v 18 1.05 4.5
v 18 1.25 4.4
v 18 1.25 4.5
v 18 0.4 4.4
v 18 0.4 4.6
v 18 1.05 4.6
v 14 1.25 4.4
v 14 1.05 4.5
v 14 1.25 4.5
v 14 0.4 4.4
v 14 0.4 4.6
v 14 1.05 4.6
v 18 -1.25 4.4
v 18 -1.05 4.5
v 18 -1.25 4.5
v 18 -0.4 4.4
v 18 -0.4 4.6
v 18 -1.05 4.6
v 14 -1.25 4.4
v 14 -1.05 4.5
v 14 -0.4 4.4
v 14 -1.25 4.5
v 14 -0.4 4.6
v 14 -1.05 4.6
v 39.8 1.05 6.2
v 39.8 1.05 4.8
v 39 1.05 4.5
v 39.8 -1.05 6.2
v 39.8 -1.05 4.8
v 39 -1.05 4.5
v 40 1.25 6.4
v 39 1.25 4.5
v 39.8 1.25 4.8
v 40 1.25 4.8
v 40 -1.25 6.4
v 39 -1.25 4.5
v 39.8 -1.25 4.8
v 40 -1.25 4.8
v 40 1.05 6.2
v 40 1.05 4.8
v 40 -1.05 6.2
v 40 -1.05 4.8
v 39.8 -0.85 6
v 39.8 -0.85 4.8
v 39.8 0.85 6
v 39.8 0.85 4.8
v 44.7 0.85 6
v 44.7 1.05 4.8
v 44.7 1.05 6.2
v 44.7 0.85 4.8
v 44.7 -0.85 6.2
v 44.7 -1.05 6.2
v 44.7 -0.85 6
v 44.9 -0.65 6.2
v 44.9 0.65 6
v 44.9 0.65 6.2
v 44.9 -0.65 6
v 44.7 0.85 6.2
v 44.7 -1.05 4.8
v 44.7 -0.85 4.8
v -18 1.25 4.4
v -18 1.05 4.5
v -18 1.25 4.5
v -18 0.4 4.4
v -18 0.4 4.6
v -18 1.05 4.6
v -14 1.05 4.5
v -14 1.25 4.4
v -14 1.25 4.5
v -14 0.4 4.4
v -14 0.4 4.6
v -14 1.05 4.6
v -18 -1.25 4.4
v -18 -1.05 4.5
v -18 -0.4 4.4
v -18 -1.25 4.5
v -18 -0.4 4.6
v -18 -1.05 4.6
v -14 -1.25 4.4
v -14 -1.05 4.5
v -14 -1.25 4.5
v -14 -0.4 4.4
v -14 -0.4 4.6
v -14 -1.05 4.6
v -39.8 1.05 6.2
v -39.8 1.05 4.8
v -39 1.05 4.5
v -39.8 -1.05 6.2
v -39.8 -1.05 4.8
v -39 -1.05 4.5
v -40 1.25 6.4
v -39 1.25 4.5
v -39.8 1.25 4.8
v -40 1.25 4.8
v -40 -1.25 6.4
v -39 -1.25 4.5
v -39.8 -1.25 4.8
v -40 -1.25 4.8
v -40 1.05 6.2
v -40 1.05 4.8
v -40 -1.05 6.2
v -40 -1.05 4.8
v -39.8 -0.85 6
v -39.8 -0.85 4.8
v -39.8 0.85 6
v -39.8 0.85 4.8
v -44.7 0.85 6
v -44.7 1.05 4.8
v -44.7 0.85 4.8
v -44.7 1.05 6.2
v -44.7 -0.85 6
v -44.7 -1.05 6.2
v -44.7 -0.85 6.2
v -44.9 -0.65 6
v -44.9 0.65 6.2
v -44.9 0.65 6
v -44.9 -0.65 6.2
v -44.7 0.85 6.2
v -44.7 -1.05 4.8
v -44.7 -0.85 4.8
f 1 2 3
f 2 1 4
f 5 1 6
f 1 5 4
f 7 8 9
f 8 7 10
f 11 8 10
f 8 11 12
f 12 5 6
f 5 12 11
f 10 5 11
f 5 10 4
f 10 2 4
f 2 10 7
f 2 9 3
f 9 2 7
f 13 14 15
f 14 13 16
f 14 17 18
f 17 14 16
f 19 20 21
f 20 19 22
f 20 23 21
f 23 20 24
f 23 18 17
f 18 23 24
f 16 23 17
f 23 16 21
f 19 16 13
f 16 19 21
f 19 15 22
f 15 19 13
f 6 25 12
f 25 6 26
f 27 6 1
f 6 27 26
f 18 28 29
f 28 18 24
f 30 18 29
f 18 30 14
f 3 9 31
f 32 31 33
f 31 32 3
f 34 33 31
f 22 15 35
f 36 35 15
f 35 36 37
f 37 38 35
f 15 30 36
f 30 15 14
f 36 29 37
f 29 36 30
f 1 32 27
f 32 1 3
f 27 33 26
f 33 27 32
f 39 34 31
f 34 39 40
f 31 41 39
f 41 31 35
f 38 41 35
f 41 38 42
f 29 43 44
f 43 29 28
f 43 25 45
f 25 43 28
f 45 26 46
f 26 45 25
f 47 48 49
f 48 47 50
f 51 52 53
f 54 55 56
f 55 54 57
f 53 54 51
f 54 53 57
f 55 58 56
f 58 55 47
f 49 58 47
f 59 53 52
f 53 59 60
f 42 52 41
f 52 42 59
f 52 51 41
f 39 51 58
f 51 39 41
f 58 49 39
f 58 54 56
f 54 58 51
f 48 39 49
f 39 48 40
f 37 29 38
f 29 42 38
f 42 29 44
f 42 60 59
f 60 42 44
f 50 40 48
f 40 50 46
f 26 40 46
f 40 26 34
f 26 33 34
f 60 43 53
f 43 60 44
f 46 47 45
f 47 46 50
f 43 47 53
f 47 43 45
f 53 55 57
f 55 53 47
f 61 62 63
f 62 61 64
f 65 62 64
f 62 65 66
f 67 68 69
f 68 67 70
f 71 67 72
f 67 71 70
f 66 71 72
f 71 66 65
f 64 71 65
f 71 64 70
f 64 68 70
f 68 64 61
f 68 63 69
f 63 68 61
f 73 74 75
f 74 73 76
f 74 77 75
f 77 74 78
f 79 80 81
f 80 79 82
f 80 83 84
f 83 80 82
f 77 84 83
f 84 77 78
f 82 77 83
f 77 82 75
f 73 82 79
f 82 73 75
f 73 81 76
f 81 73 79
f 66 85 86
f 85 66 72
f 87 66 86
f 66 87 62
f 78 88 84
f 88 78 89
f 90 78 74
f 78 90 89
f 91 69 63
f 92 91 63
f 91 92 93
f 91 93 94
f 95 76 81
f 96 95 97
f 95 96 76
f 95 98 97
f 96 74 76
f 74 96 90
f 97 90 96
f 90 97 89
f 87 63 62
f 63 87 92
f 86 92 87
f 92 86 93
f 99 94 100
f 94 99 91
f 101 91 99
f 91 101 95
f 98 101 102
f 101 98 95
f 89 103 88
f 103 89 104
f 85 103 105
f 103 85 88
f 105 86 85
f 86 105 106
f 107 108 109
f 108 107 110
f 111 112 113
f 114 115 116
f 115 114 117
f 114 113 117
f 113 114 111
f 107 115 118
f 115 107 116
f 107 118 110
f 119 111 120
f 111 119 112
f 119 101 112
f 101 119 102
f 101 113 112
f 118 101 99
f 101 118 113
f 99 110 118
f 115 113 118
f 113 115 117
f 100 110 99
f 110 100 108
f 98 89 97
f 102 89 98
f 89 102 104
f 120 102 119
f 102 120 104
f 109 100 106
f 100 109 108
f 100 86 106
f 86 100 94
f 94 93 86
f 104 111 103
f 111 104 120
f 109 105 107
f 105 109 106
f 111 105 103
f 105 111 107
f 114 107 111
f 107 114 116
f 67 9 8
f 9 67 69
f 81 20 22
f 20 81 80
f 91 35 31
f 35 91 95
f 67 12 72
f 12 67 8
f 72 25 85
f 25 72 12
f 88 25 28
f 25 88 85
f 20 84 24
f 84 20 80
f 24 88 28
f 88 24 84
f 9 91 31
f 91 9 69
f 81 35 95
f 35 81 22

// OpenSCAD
// file: ../p/box2-7.scad
use <../lib.scad>
function ldraw_lib__box2_7() = [
// 0 Box with  2 Faces without  7 Edges
// 0 Name: box2-7.dat
// 0 Author: Willy Tschager [Holly-Wood]
// 0 !LDRAW_ORG Primitive UPDATE 2024-01
// 0 !LICENSE Licensed under CC BY 4.0 : see CAreadme.txt
// 
// 0 BFC CERTIFY CCW
  [0,"BFC","CERTIFY"],
  [0,"BFC","CCW"],
// 
// 0 !HISTORY 2009-05-02 [PTadmin] Official Update 2009-01
// 0 !HISTORY 2024-01-02 [Holly-Wood] Complete re-write, original by guyvivan
// 0 !HISTORY 2024-01-29 [OrionP] Official Update 2024-01
// 
// 2 24 -1 1 -1 -1 1 1
  [2,24,-1,1,-1,-1,1,1],
// 2 24 1 1 1 1 1 -1
  [2,24,1,1,1,1,1,-1],
// 4 16 -1 1 1 1 1 1 1 1 -1 -1 1 -1
  [4,16,-1,1,1,1,1,1,1,1,-1,-1,1,-1],
// 
// 2 24 -1 1 1 -1 -1 1
  [2,24,-1,1,1,-1,-1,1],
// 2 24 1 1 1 1 -1 1
  [2,24,1,1,1,1,-1,1],
// 4 16 1 -1 1 1 1 1 -1 1 1 -1 -1 1
  [4,16,1,-1,1,1,1,1,-1,1,1,-1,-1,1],
// 
// 2 24 -1 1 1 1 1 1
  [2,24,-1,1,1,1,1,1],
];
module ldraw_lib__box2_7(step=0, col=false, unit=2/5, alt=false, line=0.2, solid=!$preview)
    makepoly(ldraw_lib__box2_7(), step=step, col=col, unit=unit, alt=alt, line=line, solid=solid);
ldraw_lib__box2_7(line=0.2);
// file: s/u9611s02.scad
use <../../lib.scad>
use <../../p/box2-5.scad>
use <../../p/box2-7.scad>
function ldraw_lib__s__u9611s02() = [
// 0 ~Train Track  9V Straight - Metal Rail, Clamp
// 0 Name: s\u9611s02.dat
// 0 Author: Max Martin Richter [MMR1988]
// 0 !LDRAW_ORG Subpart UPDATE 2025-02
// 0 !LICENSE Licensed under CC BY 4.0 : see CAreadme.txt
// 
// 0 BFC CERTIFY CCW
  [0,"BFC","CERTIFY"],
  [0,"BFC","CCW"],
// 
// 0 !HISTORY 2025-02-27 [OrionP] Official Update 2025-02
// 
// 4 16 5 -11 3.125 5 -11.25 3.125 5 -11.25 2.625 5 -11 1
  [4,16,5,-11,3.125,5,-11.25,3.125,5,-11.25,2.625,5,-11,1],
// 4 16 5 -11.25 2.625 5 -11.5 2.625 5 -11.5 1 5 -11 1
  [4,16,5,-11.25,2.625,5,-11.5,2.625,5,-11.5,1,5,-11,1],
// 4 16 -5 -11.25 2.625 -5 -11.25 3.125 -5 -11 3.125 -5 -11 1
  [4,16,-5,-11.25,2.625,-5,-11.25,3.125,-5,-11,3.125,-5,-11,1],
// 4 16 -5 -11.25 2.625 -5 -11 1 -5 -11.5 1 -5 -11.5 2.625
  [4,16,-5,-11.25,2.625,-5,-11,1,-5,-11.5,1,-5,-11.5,2.625],
// 1 16 0 -11.25 1.8125 5 0 0 0 -.25 0 0 0 -.8125 box2-5.dat
  [1,16,0,-11.25,1.8125,5,0,0,0,-.25,0,0,0,-.8125, ldraw_lib__box2_5()],
// 1 16 0 -11.125 2.0625 5 0 0 0 .125 0 0 0 1.0625 box2-7.dat
  [1,16,0,-11.125,2.0625,5,0,0,0,.125,0,0,0,1.0625, ldraw_lib__box2_7()],
// 2 24 5 -11.5 2.625 5 -11.25 2.625
  [2,24,5,-11.5,2.625,5,-11.25,2.625],
// 2 24 -5 -11.5 2.625 -5 -11.25 2.625
  [2,24,-5,-11.5,2.625,-5,-11.25,2.625],
// 
// 4 16 5 -11.25 -2.625 5 -11.25 -3.125 5 -11 -3.125 5 -11 -1
  [4,16,5,-11.25,-2.625,5,-11.25,-3.125,5,-11,-3.125,5,-11,-1],
// 4 16 5 -11.5 -1 5 -11.5 -2.625 5 -11.25 -2.625 5 -11 -1
  [4,16,5,-11.5,-1,5,-11.5,-2.625,5,-11.25,-2.625,5,-11,-1],
// 4 16 -5 -11 -3.125 -5 -11.25 -3.125 -5 -11.25 -2.625 -5 -11 -1
  [4,16,-5,-11,-3.125,-5,-11.25,-3.125,-5,-11.25,-2.625,-5,-11,-1],
// 4 16 -5 -11.5 -1 -5 -11 -1 -5 -11.25 -2.625 -5 -11.5 -2.625
  [4,16,-5,-11.5,-1,-5,-11,-1,-5,-11.25,-2.625,-5,-11.5,-2.625],
// 1 16 0 -11.25 -1.8125 5 0 0 0 -.25 0 0 0 .8125 box2-5.dat
  [1,16,0,-11.25,-1.8125,5,0,0,0,-.25,0,0,0,.8125, ldraw_lib__box2_5()],
// 1 16 0 -11.125 -2.0625 5 0 0 0 .125 0 0 0 -1.0625 box2-7.dat
  [1,16,0,-11.125,-2.0625,5,0,0,0,.125,0,0,0,-1.0625, ldraw_lib__box2_7()],
// 2 24 5 -11.5 -2.625 5 -11.25 -2.625
  [2,24,5,-11.5,-2.625,5,-11.25,-2.625],
// 2 24 -5 -11.5 -2.625 -5 -11.25 -2.625
  [2,24,-5,-11.5,-2.625,-5,-11.25,-2.625],
];
module ldraw_lib__s__u9611s02(step=0, col=false, unit=2/5, alt=false, line=0.2, solid=!$preview)
    makepoly(ldraw_lib__s__u9611s02(), step=step, col=col, unit=unit, alt=alt, line=line, solid=solid);
ldraw_lib__s__u9611s02(line=0.2);
// file: ../p/recte3.scad
use <../lib.scad>
function ldraw_lib__recte3() = [
// 0 Rectangle Empty with 3 Edges
// 0 Name: recte3.dat
// 0 Author: Steffen [Steffen]
// 0 !LDRAW_ORG Primitive UPDATE 2011-01
// 0 !LICENSE Licensed under CC BY 4.0 : see CAreadme.txt
// 
// 0 BFC CERTIFY CCW
  [0,"BFC","CERTIFY"],
  [0,"BFC","CCW"],
// 
// 0 !HISTORY 2011-07-25 [PTadmin] Official Update 2011-01
// 
// 
// 2 24 1 0 1 -1 0 1
  [2,24,1,0,1,-1,0,1],
// 2 24 -1 0 1 -1 0 -1
  [2,24,-1,0,1,-1,0,-1],
// 2 24 1 0 -1 1 0 1
  [2,24,1,0,-1,1,0,1],
];
module ldraw_lib__recte3(step=0, col=false, unit=2/5, alt=false, line=0.2, solid=!$preview)
    makepoly(ldraw_lib__recte3(), step=step, col=col, unit=unit, alt=alt, line=line, solid=solid);
ldraw_lib__recte3(line=0.2);
// file: ../p/rect3.scad
use <../lib.scad>
function ldraw_lib__rect3() = [
// 0 Rectangle with 3 Edges
// 0 Name: rect3.dat
// 0 Author: Mark Kennedy [mkennedy]
// 0 !LDRAW_ORG Primitive UPDATE 2010-01
// 0 !LICENSE Licensed under CC BY 4.0 : see CAreadme.txt
// 
// 0 BFC CERTIFY CCW
  [0,"BFC","CERTIFY"],
  [0,"BFC","CCW"],
// 
// 0 !HISTORY 2003-08-01 [PTadmin] Official Update 2003-02
// 0 !HISTORY 2007-06-24 [PTadmin] Header formatted for Contributor Agreement
// 0 !HISTORY 2008-07-01 [PTadmin] Official Update 2008-01
// 0 !HISTORY 2010-01-17 [mikeheide] Change winding to CCW
// 0 !HISTORY 2010-04-05 [PTadmin] Official Update 2010-01
// 
// 
// 2 24 1 0 1 -1 0 1
  [2,24,1,0,1,-1,0,1],
// 2 24 1 0 1 1 0 -1
  [2,24,1,0,1,1,0,-1],
// 2 24 -1 0 1 -1 0 -1
  [2,24,-1,0,1,-1,0,-1],
// 4 16 -1 0 1 -1 0 -1 1 0 -1 1 0 1
  [4,16,-1,0,1,-1,0,-1,1,0,-1,1,0,1],
// 0 //
];
module ldraw_lib__rect3(step=0, col=false, unit=2/5, alt=false, line=0.2, solid=!$preview)
    makepoly(ldraw_lib__rect3(), step=step, col=col, unit=unit, alt=alt, line=line, solid=solid);
ldraw_lib__rect3(line=0.2);
// file: ../p/box2-5.scad
use <../lib.scad>
function ldraw_lib__box2_5() = [
// 0 Box with 2 Faces without 5 Edges
// 0 Name: box2-5.dat
// 0 Author: Steffen [Steffen]
// 0 !LDRAW_ORG Primitive UPDATE 2003-03
// 0 !LICENSE Licensed under CC BY 4.0 : see CAreadme.txt
// 
// 0 BFC CERTIFY CCW
  [0,"BFC","CERTIFY"],
  [0,"BFC","CCW"],
// 
// 0 !HISTORY 2003-12-19 [PTadmin] Official Update 2003-03
// 0 !HISTORY 2007-06-24 [PTadmin] Header formatted for Contributor Agreement
// 0 !HISTORY 2008-07-01 [PTadmin] Official Update 2008-01
// 
// 
// 2 24 1 1 1 -1 1 1
  [2,24,1,1,1,-1,1,1],
// 2 24 1 1 -1 -1 1 -1
  [2,24,1,1,-1,-1,1,-1],
// 2 24 1 -1 1 -1 -1 1
  [2,24,1,-1,1,-1,-1,1],
// 2 24 -1 -1 1 -1 1 1
  [2,24,-1,-1,1,-1,1,1],
// 2 24 1 -1 1 1 1 1
  [2,24,1,-1,1,1,1,1],
// 2 24 -1 1 -1 -1 1 1
  [2,24,-1,1,-1,-1,1,1],
// 2 24 1 1 -1 1 1 1
  [2,24,1,1,-1,1,1,1],
// 4 16 1 1 1 1 1 -1 -1 1 -1 -1 1 1
  [4,16,1,1,1,1,1,-1,-1,1,-1,-1,1,1],
// 4 16 1 1 1 -1 1 1 -1 -1 1 1 -1 1
  [4,16,1,1,1,-1,1,1,-1,-1,1,1,-1,1],
// 0
];
module ldraw_lib__box2_5(step=0, col=false, unit=2/5, alt=false, line=0.2, solid=!$preview)
    makepoly(ldraw_lib__box2_5(), step=step, col=col, unit=unit, alt=alt, line=line, solid=solid);
ldraw_lib__box2_5(line=0.2);
// file: s/u9627s01.scad
use <../../lib.scad>
use <../../p/box2-5.scad>
use <../../p/rect2p.scad>
use <../../p/rect3.scad>
use <../../p/recte3.scad>
use <u9611s02.scad>
function ldraw_lib__s__u9627s01() = [
// 0 ~Train Track  9V Switch Right - Straight Metal Rail, Centre Section of Main Rail, Half
// 0 Name: s\u9627s01.dat
// 0 Author: Max Martin Richter [MMR1988]
// 0 !LDRAW_ORG Subpart UPDATE 2025-08
// 0 !LICENSE Licensed under CC BY 4.0 : see CAreadme.txt
// 
// 0 BFC CERTIFY CCW
  [0,"BFC","CERTIFY"],
  [0,"BFC","CCW"],
// 
// 0 !HISTORY 2025-08-31 [OrionP] Official Update 2025-08
// 
// 1 16 40 0 0 1 0 0 0 1 0 0 0 1 s\u9611s02.dat
  [1,16,40,0,0,1,0,0,0,1,0,0,0,1, ldraw_lib__s__u9611s02()],
// 
// 4 16 35 -11.5 2.625 45 -11.5 2.625 99.5 -12 2.625 99.5 -15.5 2.625
  [4,16,35,-11.5,2.625,45,-11.5,2.625,99.5,-12,2.625,99.5,-15.5,2.625],
// 4 16 45 -11.5 2.625 45 -11.25 2.625 97.5 -11.25 2.625 99.5 -12 2.625
  [4,16,45,-11.5,2.625,45,-11.25,2.625,97.5,-11.25,2.625,99.5,-12,2.625],
// 
// 4 16 99.5 -12 -2.625 45 -11.5 -2.625 35 -11.5 -2.625 99.5 -15.5 -2.625
  [4,16,99.5,-12,-2.625,45,-11.5,-2.625,35,-11.5,-2.625,99.5,-15.5,-2.625],
// 4 16 97.5 -11.25 -2.625 45 -11.25 -2.625 45 -11.5 -2.625 99.5 -12 -2.625
  [4,16,97.5,-11.25,-2.625,45,-11.25,-2.625,45,-11.5,-2.625,99.5,-12,-2.625],
// 
// 3 16 45 -11.25 3.125 35 -11.25 3.125 100 -16 3.125
  [3,16,45,-11.25,3.125,35,-11.25,3.125,100,-16,3.125],
// 4 16 45 -11.25 3.125 100 -16 3.125 99.5 -12 3.125 97.5 -11.25 3.125
  [4,16,45,-11.25,3.125,100,-16,3.125,99.5,-12,3.125,97.5,-11.25,3.125],
// 3 16 100 -12 3.125 99.5 -12 3.125 100 -16 3.125
  [3,16,100,-12,3.125,99.5,-12,3.125,100,-16,3.125],
// 2 24 99.5 -12 3.125 100 -12 3.125
  [2,24,99.5,-12,3.125,100,-12,3.125],
// 
// 3 16 35 -11.25 -3.125 45 -11.25 -3.125 100 -16 -3.125
  [3,16,35,-11.25,-3.125,45,-11.25,-3.125,100,-16,-3.125],
// 4 16 99.5 -12 -3.125 100 -16 -3.125 45 -11.25 -3.125 97.5 -11.25 -3.125
  [4,16,99.5,-12,-3.125,100,-16,-3.125,45,-11.25,-3.125,97.5,-11.25,-3.125],
// 3 16 99.5 -12 -3.125 100 -12 -3.125 100 -16 -3.125
  [3,16,99.5,-12,-3.125,100,-12,-3.125,100,-16,-3.125],
// 2 24 99.5 -12 -3.125 100 -12 -3.125
  [2,24,99.5,-12,-3.125,100,-12,-3.125],
// 
// 1 16 72.25 -11.625 -2.875 0 -1 26.25 0 .375 0 -.25 0 0 box2-5.dat
  [1,16,72.25,-11.625,-2.875,0,-1,26.25,0,.375,0,-.25,0,0, ldraw_lib__box2_5()],
// 1 16 72.25 -11.625 2.875 0 -1 26.25 0 .375 0 -.25 0 0 box2-5.dat
  [1,16,72.25,-11.625,2.875,0,-1,26.25,0,.375,0,-.25,0,0, ldraw_lib__box2_5()],
// 
// 4 16 100 -12 3.125 100 -16 3.125 100 -15.5 2.625 100 -12 2.625
  [4,16,100,-12,3.125,100,-16,3.125,100,-15.5,2.625,100,-12,2.625],
// 4 16 100 -16 3.125 100 -16 -3.125 100 -15.5 -2.625 100 -15.5 2.625
  [4,16,100,-16,3.125,100,-16,-3.125,100,-15.5,-2.625,100,-15.5,2.625],
// 4 16 100 -15.5 -2.625 100 -16 -3.125 100 -12 -3.125 100 -12 -2.625
  [4,16,100,-15.5,-2.625,100,-16,-3.125,100,-12,-3.125,100,-12,-2.625],
// 
// 1 16 100 -14 0 0 1 0 0 0 -2 3.125 0 0 recte3.dat
  [1,16,100,-14,0,0,1,0,0,0,-2,3.125,0,0, ldraw_lib__recte3()],
// 1 16 100 -13.75 0 0 1 0 0 0 -1.75 2.625 0 0 recte3.dat
  [1,16,100,-13.75,0,0,1,0,0,0,-1.75,2.625,0,0, ldraw_lib__recte3()],
// 
// 4 16 99.5 -12 -2.625 99.5 -15.5 -2.625 99.5 -15 -2.125 99.5 -12 -2.125
  [4,16,99.5,-12,-2.625,99.5,-15.5,-2.625,99.5,-15,-2.125,99.5,-12,-2.125],
// 4 16 99.5 -15 2.125 99.5 -15 -2.125 99.5 -15.5 -2.625 99.5 -15.5 2.625
  [4,16,99.5,-15,2.125,99.5,-15,-2.125,99.5,-15.5,-2.625,99.5,-15.5,2.625],
// 4 16 99.5 -15 2.125 99.5 -15.5 2.625 99.5 -12 2.625 99.5 -12 2.125
  [4,16,99.5,-15,2.125,99.5,-15.5,2.625,99.5,-12,2.625,99.5,-12,2.125],
// 
// 1 16 99.5 -13.75 0 0 1 0 0 0 -1.75 2.625 0 0 recte3.dat
  [1,16,99.5,-13.75,0,0,1,0,0,0,-1.75,2.625,0,0, ldraw_lib__recte3()],
// 1 16 99.5 -13.5 0 0 1 0 0 0 -1.5 2.125 0 0 recte3.dat
  [1,16,99.5,-13.5,0,0,1,0,0,0,-1.5,2.125,0,0, ldraw_lib__recte3()],
// 
// 4 16 111.75 -15.5 2.625 111.75 -15 2.125 111.75 -12 2.125 111.75 -12 2.625
  [4,16,111.75,-15.5,2.625,111.75,-15,2.125,111.75,-12,2.125,111.75,-12,2.625],
// 3 16 111.75 -15.5 -2.125 111.75 -15.5 -2.625 111.75 -15 -2.125
  [3,16,111.75,-15.5,-2.125,111.75,-15.5,-2.625,111.75,-15,-2.125],
// 1 16 112 -15.25 -.25 0 .25 0 .25 0 0 0 .25 -1.625 box2-5.dat
  [1,16,112,-15.25,-.25,0,.25,0,.25,0,0,0,.25,-1.625, ldraw_lib__box2_5()],
// 1 16 112 -15.25 1.875 0 -1 -.25 .25 0 0 0 0 .25 rect3.dat
  [1,16,112,-15.25,1.875,0,-1,-.25,.25,0,0,0,0,.25, ldraw_lib__rect3()],
// 3 16 111.75 -15.5 2.625 111.75 -15.5 2.125 111.75 -15 2.125
  [3,16,111.75,-15.5,2.625,111.75,-15.5,2.125,111.75,-15,2.125],
// 4 16 111.75 -12 -2.125 111.75 -15 -2.125 111.75 -15.5 -2.625 111.75 -12 -2.625
  [4,16,111.75,-12,-2.125,111.75,-15,-2.125,111.75,-15.5,-2.625,111.75,-12,-2.625],
// 
// 1 16 111.75 -13.75 2.375 0 -1 0 1.75 0 0 0 0 .25 recte3.dat
  [1,16,111.75,-13.75,2.375,0,-1,0,1.75,0,0,0,0,.25, ldraw_lib__recte3()],
// 1 16 111.75 -13.75 -2.375 0 -1 0 1.75 0 0 0 0 -.25 recte3.dat
  [1,16,111.75,-13.75,-2.375,0,-1,0,1.75,0,0,0,0,-.25, ldraw_lib__recte3()],
// 
// 1 16 105.875 -13.75 -2.625 -5.875 0 0 0 0 1.75 0 1 0 rect2p.dat
  [1,16,105.875,-13.75,-2.625,-5.875,0,0,0,0,1.75,0,1,0, ldraw_lib__rect2p()],
// 3 16 111.75 -15.5 -2.625 111.75 -15.5 -2.125 100 -15.5 -2.625
  [3,16,111.75,-15.5,-2.625,111.75,-15.5,-2.125,100,-15.5,-2.625],
// 4 16 100 -15.5 2.625 100 -15.5 -2.625 111.75 -15.5 -2.125 111.75 -15.5 2.125
  [4,16,100,-15.5,2.625,100,-15.5,-2.625,111.75,-15.5,-2.125,111.75,-15.5,2.125],
// 3 16 111.75 -15.5 2.125 111.75 -15.5 2.625 100 -15.5 2.625
  [3,16,111.75,-15.5,2.125,111.75,-15.5,2.625,100,-15.5,2.625],
// 4 16 111.75 -15.5 -2.125 112.25 -15.5 -1.625 112.25 -15.5 1.625 111.75 -15.5 2.125
  [4,16,111.75,-15.5,-2.125,112.25,-15.5,-1.625,112.25,-15.5,1.625,111.75,-15.5,2.125],
// 1 16 105.875 -13.75 2.625 5.875 0 0 0 0 1.75 0 -1 0 rect2p.dat
  [1,16,105.875,-13.75,2.625,5.875,0,0,0,0,1.75,0,-1,0, ldraw_lib__rect2p()],
// 
// 3 16 99.5 -12 -3.125 99.5 -12 -2.625 100 -12 -3.125
  [3,16,99.5,-12,-3.125,99.5,-12,-2.625,100,-12,-3.125],
// 1 16 99.75 -12 -2.625 0 0 .25 0 -1 0 .25 0 -.25 rect2p.dat
  [1,16,99.75,-12,-2.625,0,0,.25,0,-1,0,.25,0,-.25, ldraw_lib__rect2p()],
// 4 16 111.75 -12 -2.625 100 -12 -2.625 99.5 -12 -2.125 111.75 -12 -2.125
  [4,16,111.75,-12,-2.625,100,-12,-2.625,99.5,-12,-2.125,111.75,-12,-2.125],
// 4 16 111.75 -12 2.125 99.5 -12 2.125 100 -12 2.625 111.75 -12 2.625
  [4,16,111.75,-12,2.125,99.5,-12,2.125,100,-12,2.625,111.75,-12,2.625],
// 1 16 99.75 -12 2.625 0 0 .25 0 -1 0 -.25 0 .25 rect2p.dat
  [1,16,99.75,-12,2.625,0,0,.25,0,-1,0,-.25,0,.25, ldraw_lib__rect2p()],
// 3 16 99.5 -12 2.625 99.5 -12 3.125 100 -12 3.125
  [3,16,99.5,-12,2.625,99.5,-12,3.125,100,-12,3.125],
// 
// 1 16 105.625 -13.5 -2.125 0 0 6.125 -1.5 0 0 0 -1 0 rect3.dat
  [1,16,105.625,-13.5,-2.125,0,0,6.125,-1.5,0,0,0,-1,0, ldraw_lib__rect3()],
// 
// 1 16 105.625 -13.5 2.125 0 0 6.125 1.5 0 0 0 1 0 rect3.dat
  [1,16,105.625,-13.5,2.125,0,0,6.125,1.5,0,0,0,1,0, ldraw_lib__rect3()],
// 
// 4 16 111.75 -15 2.125 111.75 -15 -2.125 99.5 -15 -2.125 99.5 -15 2.125
  [4,16,111.75,-15,2.125,111.75,-15,-2.125,99.5,-15,-2.125,99.5,-15,2.125],
// 4 16 112.25 -15 1.625 112.25 -15 -1.625 111.75 -15 -2.125 111.75 -15 2.125
  [4,16,112.25,-15,1.625,112.25,-15,-1.625,111.75,-15,-2.125,111.75,-15,2.125],
];
module ldraw_lib__s__u9627s01(step=0, col=false, unit=2/5, alt=false, line=0.2, solid=!$preview)
    makepoly(ldraw_lib__s__u9627s01(), step=step, col=col, unit=unit, alt=alt, line=line, solid=solid);
ldraw_lib__s__u9627s01(line=0.2);
// file: ../p/rect2p.scad
use <../lib.scad>
function ldraw_lib__rect2p() = [
// 0 Rectangle with 2 Parallel Edges
// 0 Name: rect2p.dat
// 0 Author: Donald Sutter [technog]
// 0 !LDRAW_ORG Primitive UPDATE 2010-01
// 0 !LICENSE Licensed under CC BY 4.0 : see CAreadme.txt
// 
// 0 BFC CERTIFY CCW
  [0,"BFC","CERTIFY"],
  [0,"BFC","CCW"],
// 
// 0 !HISTORY 2003-08-01 [PTadmin] Official Update 2003-02
// 0 !HISTORY 2007-06-24 [PTadmin] Header formatted for Contributor Agreement
// 0 !HISTORY 2008-07-01 [PTadmin] Official Update 2008-01
// 0 !HISTORY 2010-01-17 [mikeheide] changed winding to CCW
// 0 !HISTORY 2010-04-05 [PTadmin] Official Update 2010-01
// 
// 
// 2 24 1 0 1 -1 0 1
  [2,24,1,0,1,-1,0,1],
// 2 24 -1 0 -1 1 0 -1
  [2,24,-1,0,-1,1,0,-1],
// 4 16 -1 0 1 -1 0 -1 1 0 -1 1 0 1
  [4,16,-1,0,1,-1,0,-1,1,0,-1,1,0,1],
// 0
];
module ldraw_lib__rect2p(step=0, col=false, unit=2/5, alt=false, line=0.2, solid=!$preview)
    makepoly(ldraw_lib__rect2p(), step=step, col=col, unit=unit, alt=alt, line=line, solid=solid);
ldraw_lib__rect2p(line=0.2);
// file: ../p/rect.scad
use <../lib.scad>
function ldraw_lib__rect() = [
// 0 Rectangle
// 0 Name: rect.dat
// 0 Author: James Jessiman
// 0 !LDRAW_ORG Primitive UPDATE 2010-01
// 0 !LICENSE Licensed under CC BY 4.0 : see CAreadme.txt
// 
// 0 BFC CERTIFY CCW
  [0,"BFC","CERTIFY"],
  [0,"BFC","CCW"],
// 
// 0 !HISTORY 2002-04-05 [hafhead] Added BFC statement
// 0 !HISTORY 2002-04-25 [PTadmin] Official Update 2002-02
// 0 !HISTORY 2007-06-24 [PTadmin] Header formatted for Contributor Agreement
// 0 !HISTORY 2008-07-01 [PTadmin] Official Update 2008-01
// 0 !HISTORY 2010-01-17 [mikeheide] changed winding to CCW
// 0 !HISTORY 2010-04-05 [PTadmin] Official Update 2010-01
// 
// 
// 2 24 1 0 1 -1 0 1
  [2,24,1,0,1,-1,0,1],
// 2 24 -1 0 1 -1 0 -1
  [2,24,-1,0,1,-1,0,-1],
// 2 24 -1 0 -1 1 0 -1
  [2,24,-1,0,-1,1,0,-1],
// 2 24 1 0 -1 1 0 1
  [2,24,1,0,-1,1,0,1],
// 4 16 -1 0 1 -1 0 -1 1 0 -1 1 0 1
  [4,16,-1,0,1,-1,0,-1,1,0,-1,1,0,1],
// 0
];
module ldraw_lib__rect(step=0, col=false, unit=2/5, alt=false, line=0.2, solid=!$preview)
    makepoly(ldraw_lib__rect(), step=step, col=col, unit=unit, alt=alt, line=line, solid=solid);
ldraw_lib__rect(line=0.2);
// main file
use <../lib.scad>
use <../p/rect.scad>
use <../p/rect2p.scad>
use <s/u9627s01.scad>
function ldraw_lib__u9627() = [
// 0 ~Train Track  9V Switch Right - Straight Metal Rail, Centre Section of Main Rail
// 0 Name: u9627.dat
// 0 Author: Max Martin Richter [MMR1988]
// 0 !LDRAW_ORG Part UPDATE 2025-08
// 0 !LICENSE Licensed under CC BY 4.0 : see CAreadme.txt
// 
// 0 BFC CERTIFY CCW
  [0,"BFC","CERTIFY"],
  [0,"BFC","CCW"],
// 
// 0 !HISTORY 2025-08-31 [OrionP] Official Update 2025-08
// 
// 1 16 0 0 0 1 0 0 0 1 0 0 0 1 s\u9627s01.dat
  [1,16,0,0,0,1,0,0,0,1,0,0,0,1, ldraw_lib__s__u9627s01()],
// 1 16 0 0 0 -1 0 0 0 1 0 0 0 1 s\u9627s01.dat
  [1,16,0,0,0,-1,0,0,0,1,0,0,0,1, ldraw_lib__s__u9627s01()],
// 1 16 0 -11.25 2.875 35 0 0 0 -1 0 0 0 .25 rect.dat
  [1,16,0,-11.25,2.875,35,0,0,0,-1,0,0,0,.25, ldraw_lib__rect()],
// 1 16 0 -11.25 -2.875 35 0 0 0 -1 0 0 0 -.25 rect.dat
  [1,16,0,-11.25,-2.875,35,0,0,0,-1,0,0,0,-.25, ldraw_lib__rect()],
// 
// 1 16 0 -16 0 100 0 0 0 1 0 0 0 3.125 rect2p.dat
  [1,16,0,-16,0,100,0,0,0,1,0,0,0,3.125, ldraw_lib__rect2p()],
// 
// 4 16 -35 -11.25 2.625 35 -11.25 2.625 35 -11.5 2.625 -35 -11.5 2.625
  [4,16,-35,-11.25,2.625,35,-11.25,2.625,35,-11.5,2.625,-35,-11.5,2.625],
// 4 16 99.5 -15.5 2.625 -99.5 -15.5 2.625 -35 -11.5 2.625 35 -11.5 2.625
  [4,16,99.5,-15.5,2.625,-99.5,-15.5,2.625,-35,-11.5,2.625,35,-11.5,2.625],
// 
// 1 16 0 -15.5 0 99.5 0 0 0 -1 0 0 0 -2.625 rect2p.dat
  [1,16,0,-15.5,0,99.5,0,0,0,-1,0,0,0,-2.625, ldraw_lib__rect2p()],
// 
// 4 16 35 -11.5 -2.625 35 -11.25 -2.625 -35 -11.25 -2.625 -35 -11.5 -2.625
  [4,16,35,-11.5,-2.625,35,-11.25,-2.625,-35,-11.25,-2.625,-35,-11.5,-2.625],
// 4 16 -35 -11.5 -2.625 -99.5 -15.5 -2.625 99.5 -15.5 -2.625 35 -11.5 -2.625
  [4,16,-35,-11.5,-2.625,-99.5,-15.5,-2.625,99.5,-15.5,-2.625,35,-11.5,-2.625],
// 
// 4 16 -35 -11.25 3.125 -100 -16 3.125 100 -16 3.125 35 -11.25 3.125
  [4,16,-35,-11.25,3.125,-100,-16,3.125,100,-16,3.125,35,-11.25,3.125],
// 
// 4 16 -35 -11.25 -3.125 35 -11.25 -3.125 100 -16 -3.125 -100 -16 -3.125
  [4,16,-35,-11.25,-3.125,35,-11.25,-3.125,100,-16,-3.125,-100,-16,-3.125],
];
module ldraw_lib__u9627(step=0, col=false, unit=2/5, alt=false, line=0.2, solid=!$preview)
    makepoly(ldraw_lib__u9627(), step=step, col=col, unit=unit, alt=alt, line=line, solid=solid);
ldraw_lib__u9627(line=0.2);
